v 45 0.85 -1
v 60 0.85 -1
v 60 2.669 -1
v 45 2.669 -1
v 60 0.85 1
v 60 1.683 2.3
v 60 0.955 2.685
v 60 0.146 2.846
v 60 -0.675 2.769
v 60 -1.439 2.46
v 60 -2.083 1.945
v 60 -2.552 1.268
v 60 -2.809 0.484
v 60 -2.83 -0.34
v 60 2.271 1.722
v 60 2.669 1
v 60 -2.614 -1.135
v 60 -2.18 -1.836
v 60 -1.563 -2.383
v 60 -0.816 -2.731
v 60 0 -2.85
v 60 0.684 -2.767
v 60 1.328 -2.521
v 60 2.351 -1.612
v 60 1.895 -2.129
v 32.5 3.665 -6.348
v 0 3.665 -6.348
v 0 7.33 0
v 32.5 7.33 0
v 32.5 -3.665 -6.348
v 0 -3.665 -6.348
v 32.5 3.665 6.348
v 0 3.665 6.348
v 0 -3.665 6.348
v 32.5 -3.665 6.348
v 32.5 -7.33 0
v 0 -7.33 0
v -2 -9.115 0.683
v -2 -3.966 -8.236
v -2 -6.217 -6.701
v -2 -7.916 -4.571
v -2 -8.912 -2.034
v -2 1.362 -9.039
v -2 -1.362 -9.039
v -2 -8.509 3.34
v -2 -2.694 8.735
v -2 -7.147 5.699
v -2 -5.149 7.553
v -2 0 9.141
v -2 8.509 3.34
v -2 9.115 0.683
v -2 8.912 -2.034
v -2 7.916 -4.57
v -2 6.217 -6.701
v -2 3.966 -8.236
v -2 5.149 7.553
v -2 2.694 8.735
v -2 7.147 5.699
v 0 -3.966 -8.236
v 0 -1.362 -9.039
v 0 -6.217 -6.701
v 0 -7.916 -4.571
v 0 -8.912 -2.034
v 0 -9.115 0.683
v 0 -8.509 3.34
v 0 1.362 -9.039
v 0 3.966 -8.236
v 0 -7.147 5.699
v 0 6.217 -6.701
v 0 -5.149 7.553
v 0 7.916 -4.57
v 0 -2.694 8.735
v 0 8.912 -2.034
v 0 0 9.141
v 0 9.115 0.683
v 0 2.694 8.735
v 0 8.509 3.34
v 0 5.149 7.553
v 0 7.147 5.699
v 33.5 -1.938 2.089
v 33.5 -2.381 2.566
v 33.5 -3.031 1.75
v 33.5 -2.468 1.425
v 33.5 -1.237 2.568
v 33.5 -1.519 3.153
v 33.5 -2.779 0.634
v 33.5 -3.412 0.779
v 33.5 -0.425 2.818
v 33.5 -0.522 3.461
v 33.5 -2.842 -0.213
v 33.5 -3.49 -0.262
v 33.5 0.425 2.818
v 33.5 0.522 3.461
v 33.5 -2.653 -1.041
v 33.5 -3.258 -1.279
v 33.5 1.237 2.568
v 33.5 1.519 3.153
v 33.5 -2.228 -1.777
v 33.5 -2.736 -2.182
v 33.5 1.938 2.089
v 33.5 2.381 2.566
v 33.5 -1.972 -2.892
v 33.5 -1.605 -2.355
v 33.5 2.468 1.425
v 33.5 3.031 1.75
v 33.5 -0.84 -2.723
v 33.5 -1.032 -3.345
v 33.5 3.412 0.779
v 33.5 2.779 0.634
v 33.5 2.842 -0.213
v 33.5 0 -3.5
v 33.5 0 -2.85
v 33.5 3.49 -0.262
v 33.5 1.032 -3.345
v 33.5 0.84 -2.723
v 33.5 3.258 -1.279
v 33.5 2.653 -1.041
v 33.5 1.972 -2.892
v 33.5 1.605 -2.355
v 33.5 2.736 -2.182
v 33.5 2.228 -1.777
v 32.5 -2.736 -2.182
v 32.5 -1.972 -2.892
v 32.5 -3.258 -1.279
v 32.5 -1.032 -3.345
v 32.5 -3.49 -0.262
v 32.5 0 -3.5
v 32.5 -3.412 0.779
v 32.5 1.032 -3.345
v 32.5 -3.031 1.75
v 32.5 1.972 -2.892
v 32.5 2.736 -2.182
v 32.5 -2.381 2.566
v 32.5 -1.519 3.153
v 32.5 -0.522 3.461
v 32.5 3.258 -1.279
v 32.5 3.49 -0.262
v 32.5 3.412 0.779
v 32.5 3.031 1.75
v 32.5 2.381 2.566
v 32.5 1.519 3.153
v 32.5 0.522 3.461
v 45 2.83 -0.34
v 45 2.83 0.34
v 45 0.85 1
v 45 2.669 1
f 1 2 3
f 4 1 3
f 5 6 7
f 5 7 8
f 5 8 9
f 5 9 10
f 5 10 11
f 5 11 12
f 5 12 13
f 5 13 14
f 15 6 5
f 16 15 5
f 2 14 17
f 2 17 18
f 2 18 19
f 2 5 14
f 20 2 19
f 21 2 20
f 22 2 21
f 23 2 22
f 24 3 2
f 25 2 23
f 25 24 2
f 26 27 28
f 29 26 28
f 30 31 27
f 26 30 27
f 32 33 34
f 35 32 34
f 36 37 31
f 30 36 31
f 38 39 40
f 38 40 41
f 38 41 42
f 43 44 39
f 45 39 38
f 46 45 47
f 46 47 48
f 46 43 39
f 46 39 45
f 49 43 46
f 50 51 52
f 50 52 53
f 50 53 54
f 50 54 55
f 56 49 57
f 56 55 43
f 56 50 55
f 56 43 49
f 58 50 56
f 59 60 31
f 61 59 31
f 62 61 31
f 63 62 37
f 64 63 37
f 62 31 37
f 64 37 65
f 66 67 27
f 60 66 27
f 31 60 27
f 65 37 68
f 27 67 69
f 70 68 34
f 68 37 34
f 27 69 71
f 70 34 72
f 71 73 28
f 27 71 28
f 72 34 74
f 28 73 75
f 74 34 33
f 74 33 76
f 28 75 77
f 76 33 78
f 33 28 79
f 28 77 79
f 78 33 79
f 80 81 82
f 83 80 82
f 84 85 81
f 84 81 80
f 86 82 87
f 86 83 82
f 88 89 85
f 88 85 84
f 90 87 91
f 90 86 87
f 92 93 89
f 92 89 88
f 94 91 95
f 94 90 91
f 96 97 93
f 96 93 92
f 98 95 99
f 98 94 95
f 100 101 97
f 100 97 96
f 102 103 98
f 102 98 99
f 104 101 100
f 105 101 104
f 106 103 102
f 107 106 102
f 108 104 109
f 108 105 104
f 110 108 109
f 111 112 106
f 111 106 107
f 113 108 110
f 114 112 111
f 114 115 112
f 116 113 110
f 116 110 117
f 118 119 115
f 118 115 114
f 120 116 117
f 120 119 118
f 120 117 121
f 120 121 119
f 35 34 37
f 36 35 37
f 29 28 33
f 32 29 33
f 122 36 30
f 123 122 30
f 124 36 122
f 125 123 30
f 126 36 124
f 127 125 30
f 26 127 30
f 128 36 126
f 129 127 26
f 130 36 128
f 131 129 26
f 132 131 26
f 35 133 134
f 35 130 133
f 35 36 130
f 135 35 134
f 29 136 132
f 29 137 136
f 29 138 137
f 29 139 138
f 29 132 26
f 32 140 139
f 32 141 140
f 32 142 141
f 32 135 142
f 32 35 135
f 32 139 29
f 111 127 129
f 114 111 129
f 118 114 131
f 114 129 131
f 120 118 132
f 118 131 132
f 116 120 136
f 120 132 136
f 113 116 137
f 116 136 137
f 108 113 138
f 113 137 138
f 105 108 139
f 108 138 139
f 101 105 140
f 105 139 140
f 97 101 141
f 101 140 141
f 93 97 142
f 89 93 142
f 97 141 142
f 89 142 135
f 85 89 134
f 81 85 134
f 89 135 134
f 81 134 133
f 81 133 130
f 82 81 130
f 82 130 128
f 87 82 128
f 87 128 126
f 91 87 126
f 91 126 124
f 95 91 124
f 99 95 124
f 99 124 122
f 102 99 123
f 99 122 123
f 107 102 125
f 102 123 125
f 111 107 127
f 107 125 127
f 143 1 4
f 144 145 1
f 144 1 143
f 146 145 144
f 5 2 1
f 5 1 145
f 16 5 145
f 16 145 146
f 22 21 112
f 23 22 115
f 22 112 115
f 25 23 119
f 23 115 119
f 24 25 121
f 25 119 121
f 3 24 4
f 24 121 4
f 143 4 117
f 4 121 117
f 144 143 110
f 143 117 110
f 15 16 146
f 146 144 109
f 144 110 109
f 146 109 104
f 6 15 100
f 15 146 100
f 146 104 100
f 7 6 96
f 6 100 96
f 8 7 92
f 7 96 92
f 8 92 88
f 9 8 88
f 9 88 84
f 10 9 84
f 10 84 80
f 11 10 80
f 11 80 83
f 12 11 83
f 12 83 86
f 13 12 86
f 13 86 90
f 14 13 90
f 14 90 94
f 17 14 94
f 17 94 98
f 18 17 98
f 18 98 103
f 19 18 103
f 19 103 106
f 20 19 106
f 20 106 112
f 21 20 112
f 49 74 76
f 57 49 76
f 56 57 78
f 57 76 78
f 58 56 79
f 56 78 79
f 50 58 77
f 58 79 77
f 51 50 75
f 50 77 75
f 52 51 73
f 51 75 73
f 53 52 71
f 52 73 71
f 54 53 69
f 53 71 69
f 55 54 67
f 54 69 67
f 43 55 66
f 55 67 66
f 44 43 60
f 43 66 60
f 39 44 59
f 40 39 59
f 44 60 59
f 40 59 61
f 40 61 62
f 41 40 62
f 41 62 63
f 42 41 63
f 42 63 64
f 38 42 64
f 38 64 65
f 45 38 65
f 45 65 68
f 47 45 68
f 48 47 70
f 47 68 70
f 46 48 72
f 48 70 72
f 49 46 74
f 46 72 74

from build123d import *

# Parameters (mm, degrees)
SKETCH1_R           = 2.85
BOSS_EXTRUDE1_DEPTH = 60
SKETCH2_R           = 9.141
BOSS_EXTRUDE2_DEPTH = 2
BOSS_EXTRUDE3_DEPTH = 32.5
SKETCH4_W           = 2
SKETCH4_H           = 2
CUT_EXTRUDE1_DEPTH  = 15
SKETCH5_R           = 3.5
BOSS_EXTRUDE5_DEPTH = 1


with BuildPart() as part:
    # Sketch1 → Boss-Extrude1 (new body)
    with BuildSketch(Plane.YZ):
        with Locations(Location((0, 0, 0), (0, 0, 270))):
            Circle(SKETCH1_R)
    extrude(amount=BOSS_EXTRUDE1_DEPTH)

    # Sketch2 → Boss-Extrude2 (add)
    with BuildSketch(Plane(origin=(0, 0, 0), x_dir=(0, -1, 0), z_dir=(-1, 0, 0))):
        with Locations(Location((0, 0, 0), (0, 0, 90))):
            Circle(SKETCH2_R)
    extrude(amount=BOSS_EXTRUDE2_DEPTH)

    # Sketch3 → Boss-Extrude3 (add)
    with BuildSketch(Plane.YZ):
        Polygon((3.665, 6.34796621), (-3.665, 6.34796621), (-7.33, 0), (-3.665, -6.34796621), (3.665, -6.34796621), (7.33, 0), align=None)
    extrude(amount=BOSS_EXTRUDE3_DEPTH)

    # Sketch4 → Cut-Extrude1 (cut)
    with BuildSketch(Plane.YZ.offset(60)):
        with Locations((1.85, 0)):
            Rectangle(SKETCH4_W, SKETCH4_H)
    extrude(amount=-CUT_EXTRUDE1_DEPTH, mode=Mode.SUBTRACT)

    # Sketch5 → Boss-Extrude5 (add)
    with BuildSketch(Plane.YZ.offset(32.5)):
        with Locations(Location((0, 0, 0), (0, 0, 270))):
            Circle(SKETCH5_R)
    extrude(amount=BOSS_EXTRUDE5_DEPTH)


solid = part.part
